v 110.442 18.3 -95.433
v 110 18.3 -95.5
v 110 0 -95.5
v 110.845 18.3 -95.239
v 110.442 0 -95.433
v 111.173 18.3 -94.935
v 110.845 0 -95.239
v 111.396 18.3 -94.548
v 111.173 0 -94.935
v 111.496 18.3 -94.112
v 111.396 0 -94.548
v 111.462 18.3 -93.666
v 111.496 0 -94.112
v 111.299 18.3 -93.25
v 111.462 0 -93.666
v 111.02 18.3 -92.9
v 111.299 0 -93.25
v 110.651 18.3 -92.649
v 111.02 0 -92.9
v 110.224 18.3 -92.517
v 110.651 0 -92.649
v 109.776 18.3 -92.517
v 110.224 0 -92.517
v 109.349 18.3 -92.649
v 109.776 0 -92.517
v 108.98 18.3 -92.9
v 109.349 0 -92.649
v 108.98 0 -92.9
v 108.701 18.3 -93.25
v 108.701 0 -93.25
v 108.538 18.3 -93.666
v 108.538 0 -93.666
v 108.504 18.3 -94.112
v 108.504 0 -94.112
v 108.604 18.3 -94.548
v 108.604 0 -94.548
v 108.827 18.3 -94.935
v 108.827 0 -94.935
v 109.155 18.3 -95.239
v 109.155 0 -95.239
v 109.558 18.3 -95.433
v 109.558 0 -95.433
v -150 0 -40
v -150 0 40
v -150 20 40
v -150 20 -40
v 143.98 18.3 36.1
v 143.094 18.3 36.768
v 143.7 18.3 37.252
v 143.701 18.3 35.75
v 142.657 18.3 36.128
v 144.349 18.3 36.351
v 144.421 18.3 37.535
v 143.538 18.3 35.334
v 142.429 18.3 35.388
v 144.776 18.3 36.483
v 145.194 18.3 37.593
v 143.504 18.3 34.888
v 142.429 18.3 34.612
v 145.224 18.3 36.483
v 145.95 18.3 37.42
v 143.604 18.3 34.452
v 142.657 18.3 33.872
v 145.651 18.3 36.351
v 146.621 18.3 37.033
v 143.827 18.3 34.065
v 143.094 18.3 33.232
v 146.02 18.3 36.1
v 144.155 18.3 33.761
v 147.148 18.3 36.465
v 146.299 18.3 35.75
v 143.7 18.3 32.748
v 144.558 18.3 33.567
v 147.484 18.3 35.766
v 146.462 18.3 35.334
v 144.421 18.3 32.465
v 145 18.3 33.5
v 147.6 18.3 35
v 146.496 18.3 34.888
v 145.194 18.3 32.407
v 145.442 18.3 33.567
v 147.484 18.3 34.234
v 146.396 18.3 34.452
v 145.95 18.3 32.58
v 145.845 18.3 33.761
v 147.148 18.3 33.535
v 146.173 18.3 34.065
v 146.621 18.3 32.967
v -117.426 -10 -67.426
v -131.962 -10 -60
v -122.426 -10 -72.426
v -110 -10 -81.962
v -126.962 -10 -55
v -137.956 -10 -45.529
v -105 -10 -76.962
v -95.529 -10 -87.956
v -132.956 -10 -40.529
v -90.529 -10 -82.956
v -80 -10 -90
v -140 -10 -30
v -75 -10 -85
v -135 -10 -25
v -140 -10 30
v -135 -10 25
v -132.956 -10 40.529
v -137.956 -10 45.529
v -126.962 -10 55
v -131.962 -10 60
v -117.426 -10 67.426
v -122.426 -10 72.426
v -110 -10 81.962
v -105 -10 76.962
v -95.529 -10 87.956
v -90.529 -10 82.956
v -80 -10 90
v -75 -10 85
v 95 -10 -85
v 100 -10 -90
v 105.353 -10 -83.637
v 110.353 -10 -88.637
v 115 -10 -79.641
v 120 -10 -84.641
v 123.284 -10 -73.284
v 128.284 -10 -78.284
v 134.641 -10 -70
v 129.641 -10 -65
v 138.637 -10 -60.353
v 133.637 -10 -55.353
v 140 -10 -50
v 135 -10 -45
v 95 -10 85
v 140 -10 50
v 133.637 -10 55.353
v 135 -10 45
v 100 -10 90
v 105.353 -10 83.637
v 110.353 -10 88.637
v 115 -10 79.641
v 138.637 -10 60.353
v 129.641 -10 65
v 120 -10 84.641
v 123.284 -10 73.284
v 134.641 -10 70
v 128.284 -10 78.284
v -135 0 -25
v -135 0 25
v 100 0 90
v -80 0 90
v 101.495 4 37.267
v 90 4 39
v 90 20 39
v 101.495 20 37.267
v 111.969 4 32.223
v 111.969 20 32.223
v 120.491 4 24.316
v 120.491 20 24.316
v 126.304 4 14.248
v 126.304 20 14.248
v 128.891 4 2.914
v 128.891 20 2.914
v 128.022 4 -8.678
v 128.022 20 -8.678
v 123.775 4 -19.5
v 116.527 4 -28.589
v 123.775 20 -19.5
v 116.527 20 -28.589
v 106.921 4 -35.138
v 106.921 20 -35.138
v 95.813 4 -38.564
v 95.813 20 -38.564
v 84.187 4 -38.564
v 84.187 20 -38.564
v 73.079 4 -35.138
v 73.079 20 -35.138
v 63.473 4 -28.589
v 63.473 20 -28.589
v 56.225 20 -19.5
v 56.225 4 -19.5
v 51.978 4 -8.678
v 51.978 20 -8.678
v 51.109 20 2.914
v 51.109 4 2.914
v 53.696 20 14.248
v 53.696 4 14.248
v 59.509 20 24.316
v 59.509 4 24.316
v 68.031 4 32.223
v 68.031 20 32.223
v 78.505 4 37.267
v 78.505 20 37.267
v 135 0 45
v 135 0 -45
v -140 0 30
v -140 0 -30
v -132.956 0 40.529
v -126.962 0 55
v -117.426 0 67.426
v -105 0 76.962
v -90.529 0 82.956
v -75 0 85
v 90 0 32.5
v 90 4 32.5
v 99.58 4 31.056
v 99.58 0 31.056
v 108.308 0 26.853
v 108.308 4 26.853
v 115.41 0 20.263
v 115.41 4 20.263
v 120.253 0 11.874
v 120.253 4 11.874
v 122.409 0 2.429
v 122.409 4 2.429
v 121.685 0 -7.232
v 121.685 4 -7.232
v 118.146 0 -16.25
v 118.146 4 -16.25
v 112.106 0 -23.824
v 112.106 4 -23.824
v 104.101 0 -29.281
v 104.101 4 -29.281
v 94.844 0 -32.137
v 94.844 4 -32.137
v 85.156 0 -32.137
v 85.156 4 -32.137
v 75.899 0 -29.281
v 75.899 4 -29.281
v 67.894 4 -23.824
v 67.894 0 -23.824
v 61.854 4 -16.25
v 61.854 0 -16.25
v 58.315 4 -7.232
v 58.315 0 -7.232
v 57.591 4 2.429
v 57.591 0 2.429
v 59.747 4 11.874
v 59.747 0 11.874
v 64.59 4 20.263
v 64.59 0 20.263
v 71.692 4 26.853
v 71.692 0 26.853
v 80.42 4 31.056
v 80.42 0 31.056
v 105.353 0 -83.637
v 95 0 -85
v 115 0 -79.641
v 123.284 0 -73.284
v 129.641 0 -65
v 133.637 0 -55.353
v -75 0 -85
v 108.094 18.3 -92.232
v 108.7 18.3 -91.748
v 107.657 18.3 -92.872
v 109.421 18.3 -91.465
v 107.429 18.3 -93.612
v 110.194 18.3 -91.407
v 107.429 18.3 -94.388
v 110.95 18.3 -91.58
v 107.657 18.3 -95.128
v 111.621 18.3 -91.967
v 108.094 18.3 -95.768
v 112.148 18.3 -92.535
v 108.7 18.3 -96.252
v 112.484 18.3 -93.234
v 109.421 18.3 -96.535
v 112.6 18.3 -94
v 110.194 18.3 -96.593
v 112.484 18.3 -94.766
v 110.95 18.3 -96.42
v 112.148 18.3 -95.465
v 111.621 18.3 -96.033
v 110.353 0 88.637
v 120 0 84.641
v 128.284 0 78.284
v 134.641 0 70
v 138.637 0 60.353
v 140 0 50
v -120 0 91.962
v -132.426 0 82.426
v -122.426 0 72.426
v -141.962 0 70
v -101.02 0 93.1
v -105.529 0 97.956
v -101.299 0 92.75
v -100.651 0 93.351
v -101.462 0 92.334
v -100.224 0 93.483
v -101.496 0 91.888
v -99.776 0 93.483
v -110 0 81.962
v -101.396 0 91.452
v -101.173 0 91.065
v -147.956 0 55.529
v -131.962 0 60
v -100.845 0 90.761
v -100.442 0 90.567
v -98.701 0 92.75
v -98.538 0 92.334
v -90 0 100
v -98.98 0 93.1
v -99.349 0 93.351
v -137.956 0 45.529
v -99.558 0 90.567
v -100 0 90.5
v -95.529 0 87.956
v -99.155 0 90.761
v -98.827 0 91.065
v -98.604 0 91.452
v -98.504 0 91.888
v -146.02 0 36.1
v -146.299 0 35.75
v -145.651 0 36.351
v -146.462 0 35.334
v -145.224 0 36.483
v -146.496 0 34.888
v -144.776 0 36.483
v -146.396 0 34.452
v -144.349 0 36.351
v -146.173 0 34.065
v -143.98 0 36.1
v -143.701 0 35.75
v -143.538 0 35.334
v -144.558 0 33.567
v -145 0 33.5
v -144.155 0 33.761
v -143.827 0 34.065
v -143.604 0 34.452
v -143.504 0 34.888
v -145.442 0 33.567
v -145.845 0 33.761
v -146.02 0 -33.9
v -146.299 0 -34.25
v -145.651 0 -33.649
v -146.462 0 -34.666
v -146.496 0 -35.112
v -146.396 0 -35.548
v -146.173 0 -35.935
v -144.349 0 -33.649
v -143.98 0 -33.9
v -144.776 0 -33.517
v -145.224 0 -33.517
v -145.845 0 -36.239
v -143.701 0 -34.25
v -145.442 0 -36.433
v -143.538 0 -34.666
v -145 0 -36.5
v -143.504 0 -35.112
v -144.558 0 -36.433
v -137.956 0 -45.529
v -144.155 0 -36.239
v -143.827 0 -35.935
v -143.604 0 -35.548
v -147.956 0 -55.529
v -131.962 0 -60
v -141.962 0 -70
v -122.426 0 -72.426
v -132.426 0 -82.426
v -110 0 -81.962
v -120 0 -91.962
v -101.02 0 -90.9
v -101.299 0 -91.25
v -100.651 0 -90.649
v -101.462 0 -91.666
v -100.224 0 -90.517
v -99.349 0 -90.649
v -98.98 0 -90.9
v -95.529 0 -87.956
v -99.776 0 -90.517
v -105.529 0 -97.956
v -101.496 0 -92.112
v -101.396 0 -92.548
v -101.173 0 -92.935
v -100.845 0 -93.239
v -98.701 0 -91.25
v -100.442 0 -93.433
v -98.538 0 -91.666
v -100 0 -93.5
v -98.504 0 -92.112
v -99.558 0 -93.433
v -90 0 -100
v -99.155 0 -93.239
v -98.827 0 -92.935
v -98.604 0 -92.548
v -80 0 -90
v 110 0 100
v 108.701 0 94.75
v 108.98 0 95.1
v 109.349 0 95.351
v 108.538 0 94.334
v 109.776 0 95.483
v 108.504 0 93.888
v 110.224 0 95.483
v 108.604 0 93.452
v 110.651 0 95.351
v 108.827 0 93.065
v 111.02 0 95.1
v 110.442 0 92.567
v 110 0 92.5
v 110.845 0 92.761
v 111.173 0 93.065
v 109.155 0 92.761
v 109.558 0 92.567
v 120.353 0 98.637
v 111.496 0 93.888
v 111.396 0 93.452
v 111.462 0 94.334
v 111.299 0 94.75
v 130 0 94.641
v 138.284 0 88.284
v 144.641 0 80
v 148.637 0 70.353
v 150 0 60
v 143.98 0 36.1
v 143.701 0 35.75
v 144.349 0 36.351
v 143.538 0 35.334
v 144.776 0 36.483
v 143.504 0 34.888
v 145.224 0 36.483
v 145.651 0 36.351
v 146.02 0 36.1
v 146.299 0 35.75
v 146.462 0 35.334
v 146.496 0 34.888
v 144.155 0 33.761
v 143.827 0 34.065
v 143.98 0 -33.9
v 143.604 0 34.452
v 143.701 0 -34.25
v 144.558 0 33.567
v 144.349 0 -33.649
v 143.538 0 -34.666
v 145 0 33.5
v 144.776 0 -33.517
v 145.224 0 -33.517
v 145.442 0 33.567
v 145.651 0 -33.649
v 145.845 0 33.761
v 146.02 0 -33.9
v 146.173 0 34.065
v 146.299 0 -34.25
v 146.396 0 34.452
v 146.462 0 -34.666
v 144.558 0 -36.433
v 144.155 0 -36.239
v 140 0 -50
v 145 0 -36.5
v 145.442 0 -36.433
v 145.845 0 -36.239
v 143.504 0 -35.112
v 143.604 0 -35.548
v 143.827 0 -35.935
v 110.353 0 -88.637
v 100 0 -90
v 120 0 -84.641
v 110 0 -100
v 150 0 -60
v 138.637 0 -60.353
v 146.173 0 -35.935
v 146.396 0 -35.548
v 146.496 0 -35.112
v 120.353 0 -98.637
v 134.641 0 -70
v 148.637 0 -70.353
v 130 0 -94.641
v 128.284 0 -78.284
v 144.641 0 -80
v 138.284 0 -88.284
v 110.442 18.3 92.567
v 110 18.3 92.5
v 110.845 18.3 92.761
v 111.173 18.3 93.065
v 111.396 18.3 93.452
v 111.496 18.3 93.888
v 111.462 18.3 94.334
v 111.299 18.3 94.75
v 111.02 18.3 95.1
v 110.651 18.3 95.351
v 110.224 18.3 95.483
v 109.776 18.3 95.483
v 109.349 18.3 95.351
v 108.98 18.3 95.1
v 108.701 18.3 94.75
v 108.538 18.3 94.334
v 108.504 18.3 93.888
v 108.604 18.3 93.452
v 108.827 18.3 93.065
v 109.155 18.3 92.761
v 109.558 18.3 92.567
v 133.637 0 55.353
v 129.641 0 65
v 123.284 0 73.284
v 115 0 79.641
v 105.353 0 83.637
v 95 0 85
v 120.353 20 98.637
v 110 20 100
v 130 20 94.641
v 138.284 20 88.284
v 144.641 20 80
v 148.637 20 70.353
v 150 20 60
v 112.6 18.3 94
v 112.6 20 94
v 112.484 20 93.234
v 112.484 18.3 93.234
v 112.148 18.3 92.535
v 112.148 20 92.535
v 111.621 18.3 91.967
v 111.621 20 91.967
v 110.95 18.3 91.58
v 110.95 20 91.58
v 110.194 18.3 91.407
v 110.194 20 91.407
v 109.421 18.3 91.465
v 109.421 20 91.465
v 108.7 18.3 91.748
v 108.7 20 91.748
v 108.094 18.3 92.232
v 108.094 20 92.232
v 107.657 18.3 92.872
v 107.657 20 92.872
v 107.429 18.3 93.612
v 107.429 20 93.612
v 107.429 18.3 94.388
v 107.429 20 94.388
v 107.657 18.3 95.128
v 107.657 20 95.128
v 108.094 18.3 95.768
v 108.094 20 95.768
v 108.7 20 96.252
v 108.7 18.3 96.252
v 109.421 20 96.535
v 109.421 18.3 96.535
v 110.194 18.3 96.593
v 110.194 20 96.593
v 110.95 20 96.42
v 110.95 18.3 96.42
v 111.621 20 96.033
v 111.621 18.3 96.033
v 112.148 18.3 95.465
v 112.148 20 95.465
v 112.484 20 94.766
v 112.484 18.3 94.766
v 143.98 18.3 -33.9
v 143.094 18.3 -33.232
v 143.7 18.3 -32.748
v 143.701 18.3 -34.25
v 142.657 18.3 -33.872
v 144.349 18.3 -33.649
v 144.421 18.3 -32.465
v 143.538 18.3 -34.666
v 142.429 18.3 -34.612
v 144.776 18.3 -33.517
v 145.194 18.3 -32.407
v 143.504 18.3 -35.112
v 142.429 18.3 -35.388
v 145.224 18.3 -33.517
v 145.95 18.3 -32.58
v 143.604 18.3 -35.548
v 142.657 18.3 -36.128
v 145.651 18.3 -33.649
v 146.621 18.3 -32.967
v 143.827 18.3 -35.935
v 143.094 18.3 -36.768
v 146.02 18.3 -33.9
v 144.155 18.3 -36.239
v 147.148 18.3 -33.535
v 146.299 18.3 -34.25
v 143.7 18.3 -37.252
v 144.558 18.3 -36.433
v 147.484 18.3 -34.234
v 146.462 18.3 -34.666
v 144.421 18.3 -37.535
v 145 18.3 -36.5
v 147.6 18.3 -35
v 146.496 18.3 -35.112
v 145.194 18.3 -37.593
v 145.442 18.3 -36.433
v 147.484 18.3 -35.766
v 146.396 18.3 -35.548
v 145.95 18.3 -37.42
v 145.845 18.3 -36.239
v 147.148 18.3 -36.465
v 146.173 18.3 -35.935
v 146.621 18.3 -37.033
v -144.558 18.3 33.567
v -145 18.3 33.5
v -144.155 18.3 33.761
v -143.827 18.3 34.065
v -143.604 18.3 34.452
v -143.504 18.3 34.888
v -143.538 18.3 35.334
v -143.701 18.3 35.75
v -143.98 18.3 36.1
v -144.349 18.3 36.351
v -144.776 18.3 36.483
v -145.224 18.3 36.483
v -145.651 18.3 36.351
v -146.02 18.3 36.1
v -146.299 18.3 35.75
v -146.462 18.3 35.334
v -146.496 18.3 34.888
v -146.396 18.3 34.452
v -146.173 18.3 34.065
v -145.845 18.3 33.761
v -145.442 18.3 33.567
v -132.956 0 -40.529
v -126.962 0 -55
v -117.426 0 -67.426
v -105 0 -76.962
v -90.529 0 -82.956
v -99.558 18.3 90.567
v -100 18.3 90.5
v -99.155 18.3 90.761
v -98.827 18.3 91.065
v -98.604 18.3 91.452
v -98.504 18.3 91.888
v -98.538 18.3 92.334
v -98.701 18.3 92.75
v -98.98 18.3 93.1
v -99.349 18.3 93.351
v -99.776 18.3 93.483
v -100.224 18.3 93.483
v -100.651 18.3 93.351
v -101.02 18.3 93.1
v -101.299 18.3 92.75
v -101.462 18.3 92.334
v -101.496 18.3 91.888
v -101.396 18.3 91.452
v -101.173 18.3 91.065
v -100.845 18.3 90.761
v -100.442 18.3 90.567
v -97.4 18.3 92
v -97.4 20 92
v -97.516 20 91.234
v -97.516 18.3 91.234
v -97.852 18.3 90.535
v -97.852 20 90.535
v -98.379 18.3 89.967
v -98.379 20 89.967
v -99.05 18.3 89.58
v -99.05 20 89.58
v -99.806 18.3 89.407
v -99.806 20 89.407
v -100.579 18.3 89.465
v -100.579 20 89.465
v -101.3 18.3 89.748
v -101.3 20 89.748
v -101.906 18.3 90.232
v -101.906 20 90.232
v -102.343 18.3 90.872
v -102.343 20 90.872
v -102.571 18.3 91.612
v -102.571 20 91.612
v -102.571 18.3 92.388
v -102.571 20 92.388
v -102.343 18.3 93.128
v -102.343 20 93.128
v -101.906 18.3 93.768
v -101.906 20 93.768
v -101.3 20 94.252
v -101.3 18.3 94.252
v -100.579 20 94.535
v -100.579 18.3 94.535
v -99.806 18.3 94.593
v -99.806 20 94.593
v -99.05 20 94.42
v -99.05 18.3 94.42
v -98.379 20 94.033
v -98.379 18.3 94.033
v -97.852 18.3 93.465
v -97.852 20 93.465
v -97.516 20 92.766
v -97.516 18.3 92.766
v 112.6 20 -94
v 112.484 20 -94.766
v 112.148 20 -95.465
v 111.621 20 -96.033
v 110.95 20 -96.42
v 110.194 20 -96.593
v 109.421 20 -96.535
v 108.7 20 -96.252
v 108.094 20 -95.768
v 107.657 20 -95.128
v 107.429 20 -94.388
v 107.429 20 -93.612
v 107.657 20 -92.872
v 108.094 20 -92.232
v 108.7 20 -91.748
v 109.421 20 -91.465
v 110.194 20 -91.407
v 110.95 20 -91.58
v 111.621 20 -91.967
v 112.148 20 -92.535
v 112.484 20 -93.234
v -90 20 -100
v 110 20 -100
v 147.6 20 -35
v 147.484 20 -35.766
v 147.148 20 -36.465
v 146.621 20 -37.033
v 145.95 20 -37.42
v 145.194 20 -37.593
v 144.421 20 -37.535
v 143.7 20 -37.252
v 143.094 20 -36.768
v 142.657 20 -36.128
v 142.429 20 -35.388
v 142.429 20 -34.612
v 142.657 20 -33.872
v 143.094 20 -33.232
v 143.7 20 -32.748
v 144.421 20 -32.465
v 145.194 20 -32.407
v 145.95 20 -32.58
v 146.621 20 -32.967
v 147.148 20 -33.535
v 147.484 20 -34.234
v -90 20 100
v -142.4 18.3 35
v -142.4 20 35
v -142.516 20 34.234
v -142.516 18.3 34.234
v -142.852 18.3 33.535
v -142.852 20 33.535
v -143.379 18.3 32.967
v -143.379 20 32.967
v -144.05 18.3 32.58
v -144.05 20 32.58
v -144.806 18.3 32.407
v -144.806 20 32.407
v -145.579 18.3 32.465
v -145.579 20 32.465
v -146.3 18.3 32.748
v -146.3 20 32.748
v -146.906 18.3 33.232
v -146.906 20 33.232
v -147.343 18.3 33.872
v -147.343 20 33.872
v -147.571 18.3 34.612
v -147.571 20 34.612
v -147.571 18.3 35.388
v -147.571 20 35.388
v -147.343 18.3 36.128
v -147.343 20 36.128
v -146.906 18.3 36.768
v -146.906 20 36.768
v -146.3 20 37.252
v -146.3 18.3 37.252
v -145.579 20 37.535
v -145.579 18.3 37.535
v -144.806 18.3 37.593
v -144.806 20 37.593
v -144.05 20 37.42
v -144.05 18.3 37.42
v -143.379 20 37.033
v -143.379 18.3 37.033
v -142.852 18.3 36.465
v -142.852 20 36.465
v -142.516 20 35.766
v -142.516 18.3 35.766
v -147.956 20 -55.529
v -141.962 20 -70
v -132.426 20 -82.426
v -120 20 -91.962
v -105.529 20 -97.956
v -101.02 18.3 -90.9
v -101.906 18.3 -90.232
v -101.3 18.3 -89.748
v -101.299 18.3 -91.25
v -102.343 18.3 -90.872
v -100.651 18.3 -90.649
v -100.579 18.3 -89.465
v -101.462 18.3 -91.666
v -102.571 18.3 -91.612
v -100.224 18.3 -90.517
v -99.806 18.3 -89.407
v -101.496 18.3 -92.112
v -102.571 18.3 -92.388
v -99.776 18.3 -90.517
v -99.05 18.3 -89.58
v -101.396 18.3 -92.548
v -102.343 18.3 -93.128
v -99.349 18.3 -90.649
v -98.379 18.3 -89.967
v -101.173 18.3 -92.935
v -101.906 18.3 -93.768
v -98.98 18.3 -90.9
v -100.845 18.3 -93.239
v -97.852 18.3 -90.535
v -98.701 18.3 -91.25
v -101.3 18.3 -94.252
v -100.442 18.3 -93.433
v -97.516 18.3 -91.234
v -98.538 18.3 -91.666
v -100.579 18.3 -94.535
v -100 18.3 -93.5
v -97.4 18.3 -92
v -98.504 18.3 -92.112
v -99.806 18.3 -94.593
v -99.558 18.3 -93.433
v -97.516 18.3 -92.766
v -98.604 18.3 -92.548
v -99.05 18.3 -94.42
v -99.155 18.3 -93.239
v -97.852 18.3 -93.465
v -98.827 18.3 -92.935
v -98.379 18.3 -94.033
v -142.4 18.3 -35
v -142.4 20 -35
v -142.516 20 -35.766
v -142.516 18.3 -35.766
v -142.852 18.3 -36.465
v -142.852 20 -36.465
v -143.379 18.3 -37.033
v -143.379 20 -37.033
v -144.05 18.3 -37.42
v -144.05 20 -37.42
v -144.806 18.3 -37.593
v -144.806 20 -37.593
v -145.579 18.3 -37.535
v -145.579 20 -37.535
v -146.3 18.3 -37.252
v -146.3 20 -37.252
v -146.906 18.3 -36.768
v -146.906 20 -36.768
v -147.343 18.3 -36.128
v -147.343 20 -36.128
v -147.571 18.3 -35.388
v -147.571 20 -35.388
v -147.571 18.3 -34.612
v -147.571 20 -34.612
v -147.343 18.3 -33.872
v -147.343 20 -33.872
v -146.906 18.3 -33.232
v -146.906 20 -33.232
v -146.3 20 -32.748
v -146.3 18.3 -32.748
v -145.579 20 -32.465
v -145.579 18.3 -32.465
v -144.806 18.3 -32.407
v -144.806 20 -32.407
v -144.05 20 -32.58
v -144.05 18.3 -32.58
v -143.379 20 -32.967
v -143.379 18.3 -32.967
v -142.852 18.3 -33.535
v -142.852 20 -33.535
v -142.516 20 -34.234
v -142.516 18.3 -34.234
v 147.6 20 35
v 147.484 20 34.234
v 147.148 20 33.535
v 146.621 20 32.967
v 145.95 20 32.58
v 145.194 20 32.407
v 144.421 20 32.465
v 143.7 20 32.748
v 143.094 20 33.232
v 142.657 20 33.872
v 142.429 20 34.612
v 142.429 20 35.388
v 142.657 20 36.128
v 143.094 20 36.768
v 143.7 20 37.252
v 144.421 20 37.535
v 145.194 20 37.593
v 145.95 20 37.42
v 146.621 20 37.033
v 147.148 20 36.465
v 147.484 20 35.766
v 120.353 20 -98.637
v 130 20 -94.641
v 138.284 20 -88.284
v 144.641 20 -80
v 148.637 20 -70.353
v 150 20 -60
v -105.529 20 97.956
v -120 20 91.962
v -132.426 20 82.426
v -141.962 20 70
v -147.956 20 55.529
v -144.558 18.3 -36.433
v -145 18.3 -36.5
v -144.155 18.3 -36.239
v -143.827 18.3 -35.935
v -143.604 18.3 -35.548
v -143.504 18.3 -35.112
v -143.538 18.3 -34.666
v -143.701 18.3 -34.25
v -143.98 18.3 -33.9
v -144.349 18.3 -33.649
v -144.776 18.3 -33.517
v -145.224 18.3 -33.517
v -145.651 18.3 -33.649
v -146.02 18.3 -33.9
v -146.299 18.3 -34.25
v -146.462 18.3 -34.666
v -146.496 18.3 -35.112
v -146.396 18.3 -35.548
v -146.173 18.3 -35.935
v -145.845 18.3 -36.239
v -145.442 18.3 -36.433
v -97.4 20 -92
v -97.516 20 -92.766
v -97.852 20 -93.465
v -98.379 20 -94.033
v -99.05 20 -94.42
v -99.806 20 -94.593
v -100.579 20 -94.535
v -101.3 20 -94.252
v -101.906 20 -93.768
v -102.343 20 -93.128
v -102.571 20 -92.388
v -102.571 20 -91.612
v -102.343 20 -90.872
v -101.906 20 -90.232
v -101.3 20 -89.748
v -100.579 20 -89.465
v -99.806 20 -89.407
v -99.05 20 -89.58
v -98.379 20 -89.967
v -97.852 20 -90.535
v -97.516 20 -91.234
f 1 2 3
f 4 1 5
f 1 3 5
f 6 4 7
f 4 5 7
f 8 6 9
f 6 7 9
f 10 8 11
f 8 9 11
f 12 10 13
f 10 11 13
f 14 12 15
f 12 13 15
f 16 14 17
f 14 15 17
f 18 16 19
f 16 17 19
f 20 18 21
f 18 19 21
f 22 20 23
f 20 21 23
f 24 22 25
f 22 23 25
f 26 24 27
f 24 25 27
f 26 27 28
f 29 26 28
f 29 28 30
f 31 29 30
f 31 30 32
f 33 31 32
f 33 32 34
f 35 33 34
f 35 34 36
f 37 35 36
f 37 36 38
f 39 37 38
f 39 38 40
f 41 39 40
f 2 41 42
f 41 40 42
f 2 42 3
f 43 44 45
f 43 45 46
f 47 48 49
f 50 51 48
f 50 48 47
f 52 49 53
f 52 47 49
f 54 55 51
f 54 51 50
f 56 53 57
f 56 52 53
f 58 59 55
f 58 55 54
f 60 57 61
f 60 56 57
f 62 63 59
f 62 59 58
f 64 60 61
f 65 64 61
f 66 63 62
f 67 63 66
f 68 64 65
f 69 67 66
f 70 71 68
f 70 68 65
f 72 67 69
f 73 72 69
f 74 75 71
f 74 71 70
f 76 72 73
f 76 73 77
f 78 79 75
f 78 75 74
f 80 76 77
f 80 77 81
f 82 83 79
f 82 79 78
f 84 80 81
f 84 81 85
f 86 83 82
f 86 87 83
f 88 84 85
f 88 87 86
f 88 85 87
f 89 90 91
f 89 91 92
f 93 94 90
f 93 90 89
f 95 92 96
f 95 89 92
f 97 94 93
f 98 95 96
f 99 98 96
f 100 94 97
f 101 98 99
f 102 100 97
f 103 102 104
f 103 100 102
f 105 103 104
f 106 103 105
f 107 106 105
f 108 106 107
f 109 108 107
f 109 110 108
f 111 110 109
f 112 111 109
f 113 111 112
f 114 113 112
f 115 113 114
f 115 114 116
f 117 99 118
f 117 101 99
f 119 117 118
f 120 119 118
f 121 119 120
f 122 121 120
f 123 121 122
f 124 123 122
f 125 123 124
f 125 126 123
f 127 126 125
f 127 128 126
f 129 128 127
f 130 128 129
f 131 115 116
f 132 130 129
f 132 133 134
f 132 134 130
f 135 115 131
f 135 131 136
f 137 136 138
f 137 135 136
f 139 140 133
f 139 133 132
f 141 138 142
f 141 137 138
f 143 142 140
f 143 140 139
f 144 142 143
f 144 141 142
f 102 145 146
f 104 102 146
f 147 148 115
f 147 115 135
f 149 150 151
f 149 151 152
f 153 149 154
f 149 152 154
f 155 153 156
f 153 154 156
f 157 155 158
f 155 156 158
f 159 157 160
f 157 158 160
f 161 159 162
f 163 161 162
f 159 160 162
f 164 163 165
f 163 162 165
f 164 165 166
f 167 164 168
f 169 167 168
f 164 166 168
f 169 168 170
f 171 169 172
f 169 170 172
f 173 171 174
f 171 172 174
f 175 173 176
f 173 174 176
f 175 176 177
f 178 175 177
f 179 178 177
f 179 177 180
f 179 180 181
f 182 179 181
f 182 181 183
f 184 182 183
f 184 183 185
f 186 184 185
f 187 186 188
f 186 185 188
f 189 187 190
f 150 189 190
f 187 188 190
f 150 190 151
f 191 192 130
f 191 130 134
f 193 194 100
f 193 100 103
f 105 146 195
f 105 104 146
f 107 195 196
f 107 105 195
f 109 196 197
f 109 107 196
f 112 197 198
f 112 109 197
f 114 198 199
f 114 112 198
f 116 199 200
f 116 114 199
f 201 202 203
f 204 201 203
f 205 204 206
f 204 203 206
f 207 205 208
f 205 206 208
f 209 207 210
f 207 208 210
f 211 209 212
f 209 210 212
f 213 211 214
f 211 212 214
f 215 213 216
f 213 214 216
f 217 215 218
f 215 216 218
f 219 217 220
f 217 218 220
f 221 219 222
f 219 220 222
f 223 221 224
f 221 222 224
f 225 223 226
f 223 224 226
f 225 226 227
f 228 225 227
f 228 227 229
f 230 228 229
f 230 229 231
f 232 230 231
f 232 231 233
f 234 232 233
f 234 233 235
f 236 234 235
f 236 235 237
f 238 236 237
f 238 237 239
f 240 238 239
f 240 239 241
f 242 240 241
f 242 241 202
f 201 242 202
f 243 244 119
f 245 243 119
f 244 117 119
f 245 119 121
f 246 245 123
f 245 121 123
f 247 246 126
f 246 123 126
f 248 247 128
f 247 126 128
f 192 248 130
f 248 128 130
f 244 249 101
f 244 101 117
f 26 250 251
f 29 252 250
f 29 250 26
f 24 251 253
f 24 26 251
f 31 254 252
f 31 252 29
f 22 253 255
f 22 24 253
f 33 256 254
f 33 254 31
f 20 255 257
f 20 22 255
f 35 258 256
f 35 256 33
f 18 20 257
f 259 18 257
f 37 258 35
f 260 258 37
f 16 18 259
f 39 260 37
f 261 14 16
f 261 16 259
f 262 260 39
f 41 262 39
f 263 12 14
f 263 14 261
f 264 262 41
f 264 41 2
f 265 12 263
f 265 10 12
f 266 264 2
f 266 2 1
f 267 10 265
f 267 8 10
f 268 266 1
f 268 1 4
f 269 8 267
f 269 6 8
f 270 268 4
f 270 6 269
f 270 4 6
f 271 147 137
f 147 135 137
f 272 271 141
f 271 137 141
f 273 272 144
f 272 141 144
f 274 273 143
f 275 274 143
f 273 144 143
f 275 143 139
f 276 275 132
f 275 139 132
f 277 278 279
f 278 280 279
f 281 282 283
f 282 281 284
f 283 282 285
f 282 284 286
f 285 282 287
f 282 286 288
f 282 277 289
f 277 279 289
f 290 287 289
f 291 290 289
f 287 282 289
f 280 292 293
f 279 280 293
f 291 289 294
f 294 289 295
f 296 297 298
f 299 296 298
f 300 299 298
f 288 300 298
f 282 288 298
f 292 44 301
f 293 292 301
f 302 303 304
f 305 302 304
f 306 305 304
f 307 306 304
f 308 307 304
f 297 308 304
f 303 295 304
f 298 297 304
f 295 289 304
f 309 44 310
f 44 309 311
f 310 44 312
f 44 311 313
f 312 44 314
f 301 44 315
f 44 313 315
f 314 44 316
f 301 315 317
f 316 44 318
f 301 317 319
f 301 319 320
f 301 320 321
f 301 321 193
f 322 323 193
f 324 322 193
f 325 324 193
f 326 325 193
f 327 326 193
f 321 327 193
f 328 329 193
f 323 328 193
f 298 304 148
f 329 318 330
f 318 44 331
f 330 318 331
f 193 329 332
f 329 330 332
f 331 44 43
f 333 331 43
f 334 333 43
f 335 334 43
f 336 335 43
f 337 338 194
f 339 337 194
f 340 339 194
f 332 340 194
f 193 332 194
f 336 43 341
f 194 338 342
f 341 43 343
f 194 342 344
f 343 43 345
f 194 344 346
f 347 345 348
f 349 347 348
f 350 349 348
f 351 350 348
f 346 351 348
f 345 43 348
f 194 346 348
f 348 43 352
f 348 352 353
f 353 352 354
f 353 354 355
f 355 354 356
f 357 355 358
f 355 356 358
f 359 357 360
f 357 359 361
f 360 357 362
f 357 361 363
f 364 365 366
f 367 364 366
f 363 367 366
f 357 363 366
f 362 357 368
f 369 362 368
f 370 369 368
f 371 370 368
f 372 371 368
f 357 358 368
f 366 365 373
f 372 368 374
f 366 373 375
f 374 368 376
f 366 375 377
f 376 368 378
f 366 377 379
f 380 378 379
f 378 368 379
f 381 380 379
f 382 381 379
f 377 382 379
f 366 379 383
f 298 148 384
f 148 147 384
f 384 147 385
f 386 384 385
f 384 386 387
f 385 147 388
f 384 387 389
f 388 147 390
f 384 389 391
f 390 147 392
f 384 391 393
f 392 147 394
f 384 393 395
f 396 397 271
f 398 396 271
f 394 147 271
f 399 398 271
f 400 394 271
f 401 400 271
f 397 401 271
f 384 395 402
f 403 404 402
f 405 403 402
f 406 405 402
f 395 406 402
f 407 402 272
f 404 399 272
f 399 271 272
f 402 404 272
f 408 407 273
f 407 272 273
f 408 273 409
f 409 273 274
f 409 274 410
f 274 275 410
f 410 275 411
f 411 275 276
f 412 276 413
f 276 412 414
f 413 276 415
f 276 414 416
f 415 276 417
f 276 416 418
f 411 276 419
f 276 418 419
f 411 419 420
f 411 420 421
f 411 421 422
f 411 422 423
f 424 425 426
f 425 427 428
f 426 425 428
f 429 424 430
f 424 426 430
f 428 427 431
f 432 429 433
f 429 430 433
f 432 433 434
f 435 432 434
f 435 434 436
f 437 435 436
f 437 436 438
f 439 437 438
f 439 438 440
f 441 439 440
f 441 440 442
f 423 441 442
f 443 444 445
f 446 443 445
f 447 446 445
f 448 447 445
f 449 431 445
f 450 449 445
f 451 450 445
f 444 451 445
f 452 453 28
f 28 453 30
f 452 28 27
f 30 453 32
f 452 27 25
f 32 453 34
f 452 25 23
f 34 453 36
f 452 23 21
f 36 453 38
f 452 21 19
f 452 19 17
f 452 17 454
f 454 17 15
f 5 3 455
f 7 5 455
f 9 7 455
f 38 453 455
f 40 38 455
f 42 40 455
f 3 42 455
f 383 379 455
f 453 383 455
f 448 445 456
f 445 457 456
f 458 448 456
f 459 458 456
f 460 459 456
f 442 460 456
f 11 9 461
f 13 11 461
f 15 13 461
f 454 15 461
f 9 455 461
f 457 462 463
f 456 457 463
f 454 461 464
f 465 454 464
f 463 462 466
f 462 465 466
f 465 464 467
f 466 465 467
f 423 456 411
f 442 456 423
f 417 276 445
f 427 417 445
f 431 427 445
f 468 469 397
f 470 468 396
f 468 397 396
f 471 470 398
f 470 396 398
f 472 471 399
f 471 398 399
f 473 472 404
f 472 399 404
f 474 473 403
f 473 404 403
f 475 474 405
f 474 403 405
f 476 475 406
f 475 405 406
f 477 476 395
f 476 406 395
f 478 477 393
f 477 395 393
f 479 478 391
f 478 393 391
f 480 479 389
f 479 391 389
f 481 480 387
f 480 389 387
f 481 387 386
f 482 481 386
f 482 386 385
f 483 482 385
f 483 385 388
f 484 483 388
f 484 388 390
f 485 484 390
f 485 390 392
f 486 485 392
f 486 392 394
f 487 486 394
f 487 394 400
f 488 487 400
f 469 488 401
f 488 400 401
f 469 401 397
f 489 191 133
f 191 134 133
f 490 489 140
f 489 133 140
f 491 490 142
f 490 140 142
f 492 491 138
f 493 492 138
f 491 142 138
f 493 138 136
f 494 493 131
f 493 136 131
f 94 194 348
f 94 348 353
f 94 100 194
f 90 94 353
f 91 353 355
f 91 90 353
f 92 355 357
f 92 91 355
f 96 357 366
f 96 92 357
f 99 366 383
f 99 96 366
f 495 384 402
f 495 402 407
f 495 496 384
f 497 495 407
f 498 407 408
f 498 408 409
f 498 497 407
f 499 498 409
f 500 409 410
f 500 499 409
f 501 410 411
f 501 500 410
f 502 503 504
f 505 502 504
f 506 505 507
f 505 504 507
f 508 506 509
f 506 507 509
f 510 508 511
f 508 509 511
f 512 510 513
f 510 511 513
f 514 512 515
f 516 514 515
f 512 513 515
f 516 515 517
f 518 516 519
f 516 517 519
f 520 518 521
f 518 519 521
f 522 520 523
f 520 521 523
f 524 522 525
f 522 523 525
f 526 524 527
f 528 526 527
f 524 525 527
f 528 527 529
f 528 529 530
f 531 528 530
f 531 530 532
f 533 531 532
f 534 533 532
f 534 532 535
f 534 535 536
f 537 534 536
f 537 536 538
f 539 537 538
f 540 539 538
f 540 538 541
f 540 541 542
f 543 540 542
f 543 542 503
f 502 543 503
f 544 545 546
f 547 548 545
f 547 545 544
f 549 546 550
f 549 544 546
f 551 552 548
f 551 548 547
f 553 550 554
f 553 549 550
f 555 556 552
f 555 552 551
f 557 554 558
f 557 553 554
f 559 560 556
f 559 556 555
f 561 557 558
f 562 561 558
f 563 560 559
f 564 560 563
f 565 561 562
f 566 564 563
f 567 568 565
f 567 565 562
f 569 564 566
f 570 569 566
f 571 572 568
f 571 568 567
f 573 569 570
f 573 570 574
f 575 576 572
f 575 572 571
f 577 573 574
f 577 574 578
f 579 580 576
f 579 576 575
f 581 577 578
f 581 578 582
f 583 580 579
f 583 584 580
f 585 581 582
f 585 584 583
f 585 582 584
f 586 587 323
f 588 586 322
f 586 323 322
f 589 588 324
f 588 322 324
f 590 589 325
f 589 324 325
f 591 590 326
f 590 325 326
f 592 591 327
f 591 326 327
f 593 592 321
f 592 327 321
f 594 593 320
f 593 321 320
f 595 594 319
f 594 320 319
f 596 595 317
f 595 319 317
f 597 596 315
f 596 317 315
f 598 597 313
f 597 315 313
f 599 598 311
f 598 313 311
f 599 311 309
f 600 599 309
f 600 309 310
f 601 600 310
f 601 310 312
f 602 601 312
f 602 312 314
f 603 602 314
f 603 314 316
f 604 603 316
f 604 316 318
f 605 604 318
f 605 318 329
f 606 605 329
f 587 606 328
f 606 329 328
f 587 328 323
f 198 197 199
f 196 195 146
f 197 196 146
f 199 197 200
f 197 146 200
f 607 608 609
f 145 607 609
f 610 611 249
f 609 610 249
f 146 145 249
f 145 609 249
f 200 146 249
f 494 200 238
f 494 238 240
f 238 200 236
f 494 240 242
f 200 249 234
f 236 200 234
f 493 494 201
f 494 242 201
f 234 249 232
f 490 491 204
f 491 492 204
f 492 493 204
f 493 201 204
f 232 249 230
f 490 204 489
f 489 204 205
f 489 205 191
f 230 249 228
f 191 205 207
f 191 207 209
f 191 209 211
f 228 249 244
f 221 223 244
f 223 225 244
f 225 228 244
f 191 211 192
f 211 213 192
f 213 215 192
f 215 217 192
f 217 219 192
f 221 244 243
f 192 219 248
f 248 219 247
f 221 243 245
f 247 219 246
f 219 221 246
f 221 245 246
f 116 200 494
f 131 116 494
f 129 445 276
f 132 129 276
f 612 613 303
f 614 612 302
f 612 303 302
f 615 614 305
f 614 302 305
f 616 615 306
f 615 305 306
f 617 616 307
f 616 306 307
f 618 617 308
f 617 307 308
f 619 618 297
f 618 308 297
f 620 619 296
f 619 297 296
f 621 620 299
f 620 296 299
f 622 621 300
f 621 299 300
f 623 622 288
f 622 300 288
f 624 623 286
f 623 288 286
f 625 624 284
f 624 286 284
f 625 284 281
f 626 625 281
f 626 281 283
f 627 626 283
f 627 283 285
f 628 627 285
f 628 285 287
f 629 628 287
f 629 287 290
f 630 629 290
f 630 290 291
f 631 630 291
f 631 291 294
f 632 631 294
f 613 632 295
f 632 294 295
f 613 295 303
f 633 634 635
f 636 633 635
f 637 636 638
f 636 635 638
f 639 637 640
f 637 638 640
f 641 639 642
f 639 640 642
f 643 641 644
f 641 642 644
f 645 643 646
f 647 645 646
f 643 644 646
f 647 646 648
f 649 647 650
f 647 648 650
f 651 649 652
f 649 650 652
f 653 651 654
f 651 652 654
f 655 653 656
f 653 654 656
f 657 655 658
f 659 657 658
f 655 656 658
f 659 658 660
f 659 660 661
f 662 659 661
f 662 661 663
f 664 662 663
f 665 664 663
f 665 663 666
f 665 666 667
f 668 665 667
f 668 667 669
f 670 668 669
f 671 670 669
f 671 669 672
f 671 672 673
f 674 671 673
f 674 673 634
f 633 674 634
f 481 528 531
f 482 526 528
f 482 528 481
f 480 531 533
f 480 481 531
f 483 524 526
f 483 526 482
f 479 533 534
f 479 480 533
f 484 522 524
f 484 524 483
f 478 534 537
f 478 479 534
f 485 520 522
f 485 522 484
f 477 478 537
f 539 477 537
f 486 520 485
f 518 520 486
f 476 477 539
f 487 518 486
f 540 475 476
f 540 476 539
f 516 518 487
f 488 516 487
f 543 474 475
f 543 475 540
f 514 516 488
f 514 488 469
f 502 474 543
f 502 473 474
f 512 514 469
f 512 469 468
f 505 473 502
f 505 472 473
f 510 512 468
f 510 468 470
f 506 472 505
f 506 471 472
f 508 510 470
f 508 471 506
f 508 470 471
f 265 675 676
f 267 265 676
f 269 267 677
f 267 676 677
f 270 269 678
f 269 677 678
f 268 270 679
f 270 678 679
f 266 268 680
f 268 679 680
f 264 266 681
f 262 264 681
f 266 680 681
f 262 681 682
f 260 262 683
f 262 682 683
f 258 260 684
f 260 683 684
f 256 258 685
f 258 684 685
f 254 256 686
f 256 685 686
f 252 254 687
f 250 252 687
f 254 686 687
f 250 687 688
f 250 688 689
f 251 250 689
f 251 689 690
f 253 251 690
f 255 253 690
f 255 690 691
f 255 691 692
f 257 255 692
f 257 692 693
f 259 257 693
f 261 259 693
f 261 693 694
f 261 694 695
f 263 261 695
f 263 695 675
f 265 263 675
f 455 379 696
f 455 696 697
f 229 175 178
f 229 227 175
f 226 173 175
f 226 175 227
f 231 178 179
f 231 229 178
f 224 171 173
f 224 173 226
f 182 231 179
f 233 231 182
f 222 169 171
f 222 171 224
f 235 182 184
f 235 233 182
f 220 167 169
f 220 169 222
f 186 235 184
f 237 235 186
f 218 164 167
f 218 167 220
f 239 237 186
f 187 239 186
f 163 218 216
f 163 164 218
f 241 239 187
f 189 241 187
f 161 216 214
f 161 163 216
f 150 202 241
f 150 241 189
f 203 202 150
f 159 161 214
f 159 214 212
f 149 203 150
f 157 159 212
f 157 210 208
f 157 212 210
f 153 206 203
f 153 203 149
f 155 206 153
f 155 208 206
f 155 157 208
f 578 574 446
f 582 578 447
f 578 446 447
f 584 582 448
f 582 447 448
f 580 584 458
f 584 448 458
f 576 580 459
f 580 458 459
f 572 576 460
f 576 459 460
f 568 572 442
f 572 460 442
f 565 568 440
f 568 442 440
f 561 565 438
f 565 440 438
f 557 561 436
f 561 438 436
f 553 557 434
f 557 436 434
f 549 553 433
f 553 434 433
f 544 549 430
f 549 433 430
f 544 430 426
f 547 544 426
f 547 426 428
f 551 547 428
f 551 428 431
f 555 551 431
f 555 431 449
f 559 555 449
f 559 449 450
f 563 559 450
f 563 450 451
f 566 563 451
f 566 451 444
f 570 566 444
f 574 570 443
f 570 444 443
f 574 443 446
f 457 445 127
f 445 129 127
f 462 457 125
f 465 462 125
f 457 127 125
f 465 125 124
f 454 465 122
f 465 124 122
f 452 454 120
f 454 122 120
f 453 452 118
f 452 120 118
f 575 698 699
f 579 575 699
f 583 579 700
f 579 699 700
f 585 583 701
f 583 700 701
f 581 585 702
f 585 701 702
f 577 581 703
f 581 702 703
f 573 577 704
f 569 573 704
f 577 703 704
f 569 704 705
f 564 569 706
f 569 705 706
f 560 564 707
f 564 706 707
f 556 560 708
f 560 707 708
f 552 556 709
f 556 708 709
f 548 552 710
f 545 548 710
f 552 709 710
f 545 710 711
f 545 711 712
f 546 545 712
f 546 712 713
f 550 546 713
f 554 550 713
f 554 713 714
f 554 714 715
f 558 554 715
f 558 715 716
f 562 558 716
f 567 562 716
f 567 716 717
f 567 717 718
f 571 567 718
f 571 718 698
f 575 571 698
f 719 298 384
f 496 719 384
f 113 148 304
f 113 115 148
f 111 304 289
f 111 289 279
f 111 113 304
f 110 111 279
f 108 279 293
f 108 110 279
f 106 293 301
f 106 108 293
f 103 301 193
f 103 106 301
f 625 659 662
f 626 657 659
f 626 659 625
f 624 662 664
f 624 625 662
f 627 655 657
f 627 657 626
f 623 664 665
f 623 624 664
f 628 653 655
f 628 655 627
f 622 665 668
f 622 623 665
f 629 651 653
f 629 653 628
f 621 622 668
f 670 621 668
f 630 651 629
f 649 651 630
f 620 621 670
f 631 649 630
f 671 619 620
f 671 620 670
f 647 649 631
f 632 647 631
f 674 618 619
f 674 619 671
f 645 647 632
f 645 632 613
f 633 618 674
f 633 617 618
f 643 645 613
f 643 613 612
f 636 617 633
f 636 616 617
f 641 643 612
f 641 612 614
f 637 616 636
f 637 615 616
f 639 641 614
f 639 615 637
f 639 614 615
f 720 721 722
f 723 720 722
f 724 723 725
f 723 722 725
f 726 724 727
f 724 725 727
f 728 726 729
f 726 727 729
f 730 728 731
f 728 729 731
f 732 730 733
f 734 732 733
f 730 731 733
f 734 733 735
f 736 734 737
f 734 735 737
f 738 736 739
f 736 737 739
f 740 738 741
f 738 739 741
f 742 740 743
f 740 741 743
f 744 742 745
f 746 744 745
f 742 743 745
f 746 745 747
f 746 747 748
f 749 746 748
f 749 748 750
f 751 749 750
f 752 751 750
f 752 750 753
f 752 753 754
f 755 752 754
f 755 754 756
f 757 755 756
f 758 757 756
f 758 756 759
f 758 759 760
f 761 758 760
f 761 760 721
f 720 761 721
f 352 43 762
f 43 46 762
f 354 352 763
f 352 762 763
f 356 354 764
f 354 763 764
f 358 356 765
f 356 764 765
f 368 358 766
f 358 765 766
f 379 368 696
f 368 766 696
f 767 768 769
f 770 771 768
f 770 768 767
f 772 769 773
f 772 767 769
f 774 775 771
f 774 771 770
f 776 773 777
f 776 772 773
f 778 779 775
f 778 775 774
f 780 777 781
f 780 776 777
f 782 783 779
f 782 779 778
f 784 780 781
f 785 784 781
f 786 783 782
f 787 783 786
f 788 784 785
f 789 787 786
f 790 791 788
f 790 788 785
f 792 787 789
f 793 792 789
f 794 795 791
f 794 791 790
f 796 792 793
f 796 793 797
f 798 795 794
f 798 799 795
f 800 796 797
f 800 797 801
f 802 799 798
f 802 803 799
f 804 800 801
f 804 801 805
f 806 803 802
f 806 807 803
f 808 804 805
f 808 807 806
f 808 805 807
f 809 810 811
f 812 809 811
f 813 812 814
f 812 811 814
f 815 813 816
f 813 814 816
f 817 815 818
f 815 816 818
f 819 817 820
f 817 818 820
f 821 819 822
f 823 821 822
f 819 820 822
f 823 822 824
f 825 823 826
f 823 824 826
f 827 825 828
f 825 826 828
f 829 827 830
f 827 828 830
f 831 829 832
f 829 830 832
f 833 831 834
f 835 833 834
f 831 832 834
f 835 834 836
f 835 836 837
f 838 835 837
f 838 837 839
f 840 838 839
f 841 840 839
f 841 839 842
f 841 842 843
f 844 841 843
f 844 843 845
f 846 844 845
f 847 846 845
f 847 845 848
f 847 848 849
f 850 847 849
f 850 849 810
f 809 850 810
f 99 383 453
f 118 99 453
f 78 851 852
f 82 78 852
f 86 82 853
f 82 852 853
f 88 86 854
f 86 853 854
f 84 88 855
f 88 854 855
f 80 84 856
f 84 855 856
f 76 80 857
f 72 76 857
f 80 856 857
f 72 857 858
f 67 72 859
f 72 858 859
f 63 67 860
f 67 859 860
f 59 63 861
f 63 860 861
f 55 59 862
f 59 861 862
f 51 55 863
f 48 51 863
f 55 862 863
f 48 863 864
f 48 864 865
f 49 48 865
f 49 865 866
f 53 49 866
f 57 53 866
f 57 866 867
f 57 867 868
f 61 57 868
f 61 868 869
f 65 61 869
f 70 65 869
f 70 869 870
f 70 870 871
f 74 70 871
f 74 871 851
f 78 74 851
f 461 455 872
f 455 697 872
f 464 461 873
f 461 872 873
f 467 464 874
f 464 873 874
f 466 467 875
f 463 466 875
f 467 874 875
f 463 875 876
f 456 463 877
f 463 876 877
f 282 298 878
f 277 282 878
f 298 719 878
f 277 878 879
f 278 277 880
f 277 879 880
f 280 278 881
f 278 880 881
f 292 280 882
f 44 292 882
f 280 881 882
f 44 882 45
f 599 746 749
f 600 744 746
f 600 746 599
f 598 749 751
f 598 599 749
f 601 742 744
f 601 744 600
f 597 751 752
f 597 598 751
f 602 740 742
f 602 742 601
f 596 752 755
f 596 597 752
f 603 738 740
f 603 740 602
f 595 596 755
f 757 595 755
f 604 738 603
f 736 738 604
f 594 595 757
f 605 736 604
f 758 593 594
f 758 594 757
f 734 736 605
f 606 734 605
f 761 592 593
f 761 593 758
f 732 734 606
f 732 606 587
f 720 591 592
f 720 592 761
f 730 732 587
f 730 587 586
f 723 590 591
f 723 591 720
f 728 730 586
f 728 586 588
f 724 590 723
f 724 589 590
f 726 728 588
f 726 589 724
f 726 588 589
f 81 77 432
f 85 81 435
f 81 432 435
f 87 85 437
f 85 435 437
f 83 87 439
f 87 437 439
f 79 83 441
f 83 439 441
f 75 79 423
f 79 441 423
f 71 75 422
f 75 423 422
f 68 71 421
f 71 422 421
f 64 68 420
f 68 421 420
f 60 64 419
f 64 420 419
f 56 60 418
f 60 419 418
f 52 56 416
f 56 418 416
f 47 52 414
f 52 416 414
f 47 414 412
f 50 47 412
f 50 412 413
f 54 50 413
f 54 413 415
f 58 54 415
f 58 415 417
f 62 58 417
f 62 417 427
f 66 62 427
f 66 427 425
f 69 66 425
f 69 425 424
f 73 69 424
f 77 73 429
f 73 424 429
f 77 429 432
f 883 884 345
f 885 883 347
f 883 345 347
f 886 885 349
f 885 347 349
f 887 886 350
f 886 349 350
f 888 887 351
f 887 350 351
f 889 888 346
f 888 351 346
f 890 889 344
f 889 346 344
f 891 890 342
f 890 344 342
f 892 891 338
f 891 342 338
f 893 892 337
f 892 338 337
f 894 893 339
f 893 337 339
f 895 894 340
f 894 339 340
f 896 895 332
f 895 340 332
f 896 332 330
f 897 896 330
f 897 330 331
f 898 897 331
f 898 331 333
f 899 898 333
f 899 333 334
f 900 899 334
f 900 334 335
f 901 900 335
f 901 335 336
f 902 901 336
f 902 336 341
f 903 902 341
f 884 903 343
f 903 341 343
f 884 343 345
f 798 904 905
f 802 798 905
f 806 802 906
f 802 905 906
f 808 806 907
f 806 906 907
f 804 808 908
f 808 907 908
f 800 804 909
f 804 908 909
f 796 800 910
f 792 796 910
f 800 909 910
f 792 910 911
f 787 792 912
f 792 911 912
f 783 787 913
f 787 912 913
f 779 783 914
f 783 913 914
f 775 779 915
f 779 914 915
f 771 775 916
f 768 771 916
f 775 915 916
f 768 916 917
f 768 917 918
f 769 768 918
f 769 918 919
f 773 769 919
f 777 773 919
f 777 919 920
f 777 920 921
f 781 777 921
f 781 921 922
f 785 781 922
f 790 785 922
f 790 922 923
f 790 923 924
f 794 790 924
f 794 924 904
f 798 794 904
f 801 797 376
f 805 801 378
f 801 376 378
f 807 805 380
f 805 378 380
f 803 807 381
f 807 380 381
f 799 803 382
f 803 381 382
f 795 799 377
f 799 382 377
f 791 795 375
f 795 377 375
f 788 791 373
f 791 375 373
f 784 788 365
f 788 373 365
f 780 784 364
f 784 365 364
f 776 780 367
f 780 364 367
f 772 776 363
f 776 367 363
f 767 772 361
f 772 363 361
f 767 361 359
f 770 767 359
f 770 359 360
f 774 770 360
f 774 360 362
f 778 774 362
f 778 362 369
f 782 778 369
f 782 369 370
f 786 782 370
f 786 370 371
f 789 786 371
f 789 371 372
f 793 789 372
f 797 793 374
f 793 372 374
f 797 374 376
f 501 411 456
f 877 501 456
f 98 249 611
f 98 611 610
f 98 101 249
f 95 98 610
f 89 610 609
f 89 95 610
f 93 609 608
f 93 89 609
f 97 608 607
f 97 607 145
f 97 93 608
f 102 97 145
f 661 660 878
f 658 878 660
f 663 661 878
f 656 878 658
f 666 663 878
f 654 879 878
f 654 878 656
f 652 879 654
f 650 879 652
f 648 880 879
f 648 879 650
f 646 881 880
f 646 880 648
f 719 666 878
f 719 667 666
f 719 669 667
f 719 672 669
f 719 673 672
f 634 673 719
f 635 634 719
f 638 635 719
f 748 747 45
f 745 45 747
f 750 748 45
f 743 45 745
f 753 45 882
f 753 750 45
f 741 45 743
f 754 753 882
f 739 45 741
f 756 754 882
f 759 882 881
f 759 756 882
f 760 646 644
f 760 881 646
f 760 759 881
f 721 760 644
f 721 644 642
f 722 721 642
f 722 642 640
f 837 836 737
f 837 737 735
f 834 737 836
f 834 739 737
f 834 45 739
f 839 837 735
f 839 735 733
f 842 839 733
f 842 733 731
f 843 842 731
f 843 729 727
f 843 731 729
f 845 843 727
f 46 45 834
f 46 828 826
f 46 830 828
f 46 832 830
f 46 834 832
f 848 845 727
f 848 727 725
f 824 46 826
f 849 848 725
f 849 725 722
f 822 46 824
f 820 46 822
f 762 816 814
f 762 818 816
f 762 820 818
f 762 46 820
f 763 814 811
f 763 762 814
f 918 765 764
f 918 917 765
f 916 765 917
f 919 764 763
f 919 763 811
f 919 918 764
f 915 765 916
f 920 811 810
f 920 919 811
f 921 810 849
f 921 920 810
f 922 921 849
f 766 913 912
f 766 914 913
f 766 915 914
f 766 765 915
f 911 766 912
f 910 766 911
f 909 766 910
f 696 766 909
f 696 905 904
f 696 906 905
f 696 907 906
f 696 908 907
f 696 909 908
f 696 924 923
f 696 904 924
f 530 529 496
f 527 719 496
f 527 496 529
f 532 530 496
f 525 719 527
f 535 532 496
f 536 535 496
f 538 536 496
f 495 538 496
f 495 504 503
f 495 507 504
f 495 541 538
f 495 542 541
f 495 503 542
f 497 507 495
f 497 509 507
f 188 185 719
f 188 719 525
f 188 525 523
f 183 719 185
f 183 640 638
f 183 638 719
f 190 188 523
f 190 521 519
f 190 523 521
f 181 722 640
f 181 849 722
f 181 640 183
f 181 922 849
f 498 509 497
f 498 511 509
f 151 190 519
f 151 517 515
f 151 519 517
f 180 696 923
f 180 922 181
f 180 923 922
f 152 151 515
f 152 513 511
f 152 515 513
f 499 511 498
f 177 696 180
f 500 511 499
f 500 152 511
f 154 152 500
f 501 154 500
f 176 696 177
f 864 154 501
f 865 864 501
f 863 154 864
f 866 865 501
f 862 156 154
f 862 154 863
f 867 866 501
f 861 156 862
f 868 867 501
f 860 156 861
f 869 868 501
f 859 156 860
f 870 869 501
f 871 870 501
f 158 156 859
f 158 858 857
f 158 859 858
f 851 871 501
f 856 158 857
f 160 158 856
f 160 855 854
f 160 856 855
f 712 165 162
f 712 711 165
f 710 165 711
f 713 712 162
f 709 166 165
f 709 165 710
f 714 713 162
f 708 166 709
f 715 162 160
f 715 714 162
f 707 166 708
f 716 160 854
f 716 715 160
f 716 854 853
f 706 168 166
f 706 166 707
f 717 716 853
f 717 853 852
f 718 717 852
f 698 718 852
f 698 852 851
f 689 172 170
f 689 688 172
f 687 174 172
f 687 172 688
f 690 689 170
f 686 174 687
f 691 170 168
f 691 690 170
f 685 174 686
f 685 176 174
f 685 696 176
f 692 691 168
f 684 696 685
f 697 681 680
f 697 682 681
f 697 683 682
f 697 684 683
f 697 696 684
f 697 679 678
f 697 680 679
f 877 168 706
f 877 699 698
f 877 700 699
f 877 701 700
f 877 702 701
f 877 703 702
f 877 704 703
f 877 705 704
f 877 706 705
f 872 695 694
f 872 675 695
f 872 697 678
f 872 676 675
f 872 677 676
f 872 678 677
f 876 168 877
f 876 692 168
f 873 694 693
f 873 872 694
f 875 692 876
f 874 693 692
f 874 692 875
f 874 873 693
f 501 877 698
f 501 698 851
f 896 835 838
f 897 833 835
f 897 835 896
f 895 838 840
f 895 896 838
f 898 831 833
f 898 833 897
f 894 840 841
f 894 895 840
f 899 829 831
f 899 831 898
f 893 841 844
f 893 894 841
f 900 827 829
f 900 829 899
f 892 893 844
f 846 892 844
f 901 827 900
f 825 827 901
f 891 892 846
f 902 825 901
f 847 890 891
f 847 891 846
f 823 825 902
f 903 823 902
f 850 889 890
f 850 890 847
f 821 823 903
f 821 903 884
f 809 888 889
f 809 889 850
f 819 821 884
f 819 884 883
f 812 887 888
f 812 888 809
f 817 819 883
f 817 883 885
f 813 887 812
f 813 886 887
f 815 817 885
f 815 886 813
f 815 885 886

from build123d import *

# Parameters (mm, degrees)
SKETCH2_W                               = 300
SKETCH2_H                               = 200
BOSS_EXTRUDE1_DEPTH                     = 20
SKETCH3_W                               = 280
SKETCH3_H                               = 180
SKETCH3_W_2                             = 270
SKETCH3_H_2                             = 170
BOSS_EXTRUDE2_DEPTH                     = 10
FILLET1_R                               = 40
FILLET2_R                               = 60
SKETCH4_R                               = 39
CUT_EXTRUDE1_DEPTH                      = 16
SKETCH5_R                               = 32.5
CUT_EXTRUDE2_DEPTH                      = 16
SKETCH8_R                               = 1.5
CUT_EXTRUDE3_DEPTH                      = 20
CBORE_FOR_M5_HEX_HEAD_BOLT1_D           = 3
CBORE_FOR_M5_HEX_HEAD_BOLT1_DEPTH       = 20
CBORE_FOR_M5_HEX_HEAD_BOLT1_CBORE_D     = 5.2
CBORE_FOR_M5_HEX_HEAD_BOLT1_CBORE_DEPTH = 1.7
CBORE_FOR_M5_HEX_HEAD_BOLT1_TIP         = 0.901290929


with BuildPart() as part:
    # Sketch2 → Boss-Extrude1 (new body)
    with BuildSketch(Plane(origin=(0, 0, 0), x_dir=(1, 0, 0), z_dir=(0, 1, 0))):
        Rectangle(SKETCH2_W, SKETCH2_H)
    extrude(amount=BOSS_EXTRUDE1_DEPTH)

    # Sketch3 → Boss-Extrude2 (add)
    with BuildSketch(Plane.XZ):
        Rectangle(SKETCH3_W, SKETCH3_H)
        Rectangle(SKETCH3_W_2, SKETCH3_H_2, mode=Mode.SUBTRACT)
    extrude(amount=BOSS_EXTRUDE2_DEPTH)

    # Fillet1
    fillet1_edges = [part.edges().sort_by_distance(p)[0] for p in [
        (140, -5, -90),
        (140, -5, 90),
        (135, -5, -85),
        (135, -5, 85),
        (150, 10, -100),
        (150, 10, 100),
    ]]
    fillet(fillet1_edges, radius=FILLET1_R)

    # Fillet2
    fillet2_edges = [part.edges().sort_by_distance(p)[0] for p in [
        (-140, -5, 90),
        (-140, -5, -90),
        (-135, -5, -85),
        (-135, -5, 85),
        (-150, 10, -100),
        (-150, 10, 100),
    ]]
    fillet(fillet2_edges, radius=FILLET2_R)

    # Sketch4 → Cut-Extrude1 (cut)
    with BuildSketch(Plane(origin=(0, 20, 0), x_dir=(1, 0, 0), z_dir=(0, 1, 0))):
        with Locations(Location((90, 0, 0), (0, 0, 270))):
            Circle(SKETCH4_R)
    extrude(amount=-CUT_EXTRUDE1_DEPTH, mode=Mode.SUBTRACT)

    # Sketch5 → Cut-Extrude2 (cut)
    with BuildSketch(Plane(origin=(0, 4, 0), x_dir=(1, 0, 0), z_dir=(0, 1, 0))):
        with Locations(Location((90, 0, 0), (0, 0, 270))):
            Circle(SKETCH5_R)
    extrude(amount=-CUT_EXTRUDE2_DEPTH, mode=Mode.SUBTRACT)

    # Sketch8 → Cut-Extrude3 (cut)
    with BuildSketch(Plane.XZ):
        with Locations(Location((-100, 92, 0), (0, 0, 270))):
            Circle(SKETCH8_R)
        with Locations(Location((-100, -92, 0), (0, 0, 270))):
            Circle(SKETCH8_R)
        with Locations(Location((-145, 35, 0), (0, 0, 270))):
            Circle(SKETCH8_R)
        with Locations(Location((-145, -35, 0), (0, 0, 270))):
            Circle(SKETCH8_R)
        with Locations(Location((110, 94, 0), (0, 0, 270))):
            Circle(SKETCH8_R)
        with Locations(Location((110, -94, 0), (0, 0, 270))):
            Circle(SKETCH8_R)
        with Locations(Location((145, 35, 0), (0, 0, 270))):
            Circle(SKETCH8_R)
        with Locations(Location((145, -35, 0), (0, 0, 270))):
            Circle(SKETCH8_R)
    extrude(amount=-CUT_EXTRUDE3_DEPTH, mode=Mode.SUBTRACT)

    # CBORE for M5 Hex Head Bolt1
    with Locations(Plane(origin=(0, 20, 0), x_dir=(1, 0, 0), z_dir=(0, 1, 0))):
        with Locations((110, 94), (145, 35), (145, -35), (110, -94), (-100, -92), (-145, -35), (-145, 35), (-100, 92)):
            CounterBoreHole(CBORE_FOR_M5_HEX_HEAD_BOLT1_D / 2, CBORE_FOR_M5_HEX_HEAD_BOLT1_CBORE_D / 2, CBORE_FOR_M5_HEX_HEAD_BOLT1_CBORE_DEPTH, depth=CBORE_FOR_M5_HEX_HEAD_BOLT1_DEPTH)
            with Locations((0, 0, -(CBORE_FOR_M5_HEX_HEAD_BOLT1_DEPTH + CBORE_FOR_M5_HEX_HEAD_BOLT1_TIP / 2))):  # 118° drill point
                Cone(0, CBORE_FOR_M5_HEX_HEAD_BOLT1_D / 2, CBORE_FOR_M5_HEX_HEAD_BOLT1_TIP, mode=Mode.SUBTRACT)


solid = part.part
